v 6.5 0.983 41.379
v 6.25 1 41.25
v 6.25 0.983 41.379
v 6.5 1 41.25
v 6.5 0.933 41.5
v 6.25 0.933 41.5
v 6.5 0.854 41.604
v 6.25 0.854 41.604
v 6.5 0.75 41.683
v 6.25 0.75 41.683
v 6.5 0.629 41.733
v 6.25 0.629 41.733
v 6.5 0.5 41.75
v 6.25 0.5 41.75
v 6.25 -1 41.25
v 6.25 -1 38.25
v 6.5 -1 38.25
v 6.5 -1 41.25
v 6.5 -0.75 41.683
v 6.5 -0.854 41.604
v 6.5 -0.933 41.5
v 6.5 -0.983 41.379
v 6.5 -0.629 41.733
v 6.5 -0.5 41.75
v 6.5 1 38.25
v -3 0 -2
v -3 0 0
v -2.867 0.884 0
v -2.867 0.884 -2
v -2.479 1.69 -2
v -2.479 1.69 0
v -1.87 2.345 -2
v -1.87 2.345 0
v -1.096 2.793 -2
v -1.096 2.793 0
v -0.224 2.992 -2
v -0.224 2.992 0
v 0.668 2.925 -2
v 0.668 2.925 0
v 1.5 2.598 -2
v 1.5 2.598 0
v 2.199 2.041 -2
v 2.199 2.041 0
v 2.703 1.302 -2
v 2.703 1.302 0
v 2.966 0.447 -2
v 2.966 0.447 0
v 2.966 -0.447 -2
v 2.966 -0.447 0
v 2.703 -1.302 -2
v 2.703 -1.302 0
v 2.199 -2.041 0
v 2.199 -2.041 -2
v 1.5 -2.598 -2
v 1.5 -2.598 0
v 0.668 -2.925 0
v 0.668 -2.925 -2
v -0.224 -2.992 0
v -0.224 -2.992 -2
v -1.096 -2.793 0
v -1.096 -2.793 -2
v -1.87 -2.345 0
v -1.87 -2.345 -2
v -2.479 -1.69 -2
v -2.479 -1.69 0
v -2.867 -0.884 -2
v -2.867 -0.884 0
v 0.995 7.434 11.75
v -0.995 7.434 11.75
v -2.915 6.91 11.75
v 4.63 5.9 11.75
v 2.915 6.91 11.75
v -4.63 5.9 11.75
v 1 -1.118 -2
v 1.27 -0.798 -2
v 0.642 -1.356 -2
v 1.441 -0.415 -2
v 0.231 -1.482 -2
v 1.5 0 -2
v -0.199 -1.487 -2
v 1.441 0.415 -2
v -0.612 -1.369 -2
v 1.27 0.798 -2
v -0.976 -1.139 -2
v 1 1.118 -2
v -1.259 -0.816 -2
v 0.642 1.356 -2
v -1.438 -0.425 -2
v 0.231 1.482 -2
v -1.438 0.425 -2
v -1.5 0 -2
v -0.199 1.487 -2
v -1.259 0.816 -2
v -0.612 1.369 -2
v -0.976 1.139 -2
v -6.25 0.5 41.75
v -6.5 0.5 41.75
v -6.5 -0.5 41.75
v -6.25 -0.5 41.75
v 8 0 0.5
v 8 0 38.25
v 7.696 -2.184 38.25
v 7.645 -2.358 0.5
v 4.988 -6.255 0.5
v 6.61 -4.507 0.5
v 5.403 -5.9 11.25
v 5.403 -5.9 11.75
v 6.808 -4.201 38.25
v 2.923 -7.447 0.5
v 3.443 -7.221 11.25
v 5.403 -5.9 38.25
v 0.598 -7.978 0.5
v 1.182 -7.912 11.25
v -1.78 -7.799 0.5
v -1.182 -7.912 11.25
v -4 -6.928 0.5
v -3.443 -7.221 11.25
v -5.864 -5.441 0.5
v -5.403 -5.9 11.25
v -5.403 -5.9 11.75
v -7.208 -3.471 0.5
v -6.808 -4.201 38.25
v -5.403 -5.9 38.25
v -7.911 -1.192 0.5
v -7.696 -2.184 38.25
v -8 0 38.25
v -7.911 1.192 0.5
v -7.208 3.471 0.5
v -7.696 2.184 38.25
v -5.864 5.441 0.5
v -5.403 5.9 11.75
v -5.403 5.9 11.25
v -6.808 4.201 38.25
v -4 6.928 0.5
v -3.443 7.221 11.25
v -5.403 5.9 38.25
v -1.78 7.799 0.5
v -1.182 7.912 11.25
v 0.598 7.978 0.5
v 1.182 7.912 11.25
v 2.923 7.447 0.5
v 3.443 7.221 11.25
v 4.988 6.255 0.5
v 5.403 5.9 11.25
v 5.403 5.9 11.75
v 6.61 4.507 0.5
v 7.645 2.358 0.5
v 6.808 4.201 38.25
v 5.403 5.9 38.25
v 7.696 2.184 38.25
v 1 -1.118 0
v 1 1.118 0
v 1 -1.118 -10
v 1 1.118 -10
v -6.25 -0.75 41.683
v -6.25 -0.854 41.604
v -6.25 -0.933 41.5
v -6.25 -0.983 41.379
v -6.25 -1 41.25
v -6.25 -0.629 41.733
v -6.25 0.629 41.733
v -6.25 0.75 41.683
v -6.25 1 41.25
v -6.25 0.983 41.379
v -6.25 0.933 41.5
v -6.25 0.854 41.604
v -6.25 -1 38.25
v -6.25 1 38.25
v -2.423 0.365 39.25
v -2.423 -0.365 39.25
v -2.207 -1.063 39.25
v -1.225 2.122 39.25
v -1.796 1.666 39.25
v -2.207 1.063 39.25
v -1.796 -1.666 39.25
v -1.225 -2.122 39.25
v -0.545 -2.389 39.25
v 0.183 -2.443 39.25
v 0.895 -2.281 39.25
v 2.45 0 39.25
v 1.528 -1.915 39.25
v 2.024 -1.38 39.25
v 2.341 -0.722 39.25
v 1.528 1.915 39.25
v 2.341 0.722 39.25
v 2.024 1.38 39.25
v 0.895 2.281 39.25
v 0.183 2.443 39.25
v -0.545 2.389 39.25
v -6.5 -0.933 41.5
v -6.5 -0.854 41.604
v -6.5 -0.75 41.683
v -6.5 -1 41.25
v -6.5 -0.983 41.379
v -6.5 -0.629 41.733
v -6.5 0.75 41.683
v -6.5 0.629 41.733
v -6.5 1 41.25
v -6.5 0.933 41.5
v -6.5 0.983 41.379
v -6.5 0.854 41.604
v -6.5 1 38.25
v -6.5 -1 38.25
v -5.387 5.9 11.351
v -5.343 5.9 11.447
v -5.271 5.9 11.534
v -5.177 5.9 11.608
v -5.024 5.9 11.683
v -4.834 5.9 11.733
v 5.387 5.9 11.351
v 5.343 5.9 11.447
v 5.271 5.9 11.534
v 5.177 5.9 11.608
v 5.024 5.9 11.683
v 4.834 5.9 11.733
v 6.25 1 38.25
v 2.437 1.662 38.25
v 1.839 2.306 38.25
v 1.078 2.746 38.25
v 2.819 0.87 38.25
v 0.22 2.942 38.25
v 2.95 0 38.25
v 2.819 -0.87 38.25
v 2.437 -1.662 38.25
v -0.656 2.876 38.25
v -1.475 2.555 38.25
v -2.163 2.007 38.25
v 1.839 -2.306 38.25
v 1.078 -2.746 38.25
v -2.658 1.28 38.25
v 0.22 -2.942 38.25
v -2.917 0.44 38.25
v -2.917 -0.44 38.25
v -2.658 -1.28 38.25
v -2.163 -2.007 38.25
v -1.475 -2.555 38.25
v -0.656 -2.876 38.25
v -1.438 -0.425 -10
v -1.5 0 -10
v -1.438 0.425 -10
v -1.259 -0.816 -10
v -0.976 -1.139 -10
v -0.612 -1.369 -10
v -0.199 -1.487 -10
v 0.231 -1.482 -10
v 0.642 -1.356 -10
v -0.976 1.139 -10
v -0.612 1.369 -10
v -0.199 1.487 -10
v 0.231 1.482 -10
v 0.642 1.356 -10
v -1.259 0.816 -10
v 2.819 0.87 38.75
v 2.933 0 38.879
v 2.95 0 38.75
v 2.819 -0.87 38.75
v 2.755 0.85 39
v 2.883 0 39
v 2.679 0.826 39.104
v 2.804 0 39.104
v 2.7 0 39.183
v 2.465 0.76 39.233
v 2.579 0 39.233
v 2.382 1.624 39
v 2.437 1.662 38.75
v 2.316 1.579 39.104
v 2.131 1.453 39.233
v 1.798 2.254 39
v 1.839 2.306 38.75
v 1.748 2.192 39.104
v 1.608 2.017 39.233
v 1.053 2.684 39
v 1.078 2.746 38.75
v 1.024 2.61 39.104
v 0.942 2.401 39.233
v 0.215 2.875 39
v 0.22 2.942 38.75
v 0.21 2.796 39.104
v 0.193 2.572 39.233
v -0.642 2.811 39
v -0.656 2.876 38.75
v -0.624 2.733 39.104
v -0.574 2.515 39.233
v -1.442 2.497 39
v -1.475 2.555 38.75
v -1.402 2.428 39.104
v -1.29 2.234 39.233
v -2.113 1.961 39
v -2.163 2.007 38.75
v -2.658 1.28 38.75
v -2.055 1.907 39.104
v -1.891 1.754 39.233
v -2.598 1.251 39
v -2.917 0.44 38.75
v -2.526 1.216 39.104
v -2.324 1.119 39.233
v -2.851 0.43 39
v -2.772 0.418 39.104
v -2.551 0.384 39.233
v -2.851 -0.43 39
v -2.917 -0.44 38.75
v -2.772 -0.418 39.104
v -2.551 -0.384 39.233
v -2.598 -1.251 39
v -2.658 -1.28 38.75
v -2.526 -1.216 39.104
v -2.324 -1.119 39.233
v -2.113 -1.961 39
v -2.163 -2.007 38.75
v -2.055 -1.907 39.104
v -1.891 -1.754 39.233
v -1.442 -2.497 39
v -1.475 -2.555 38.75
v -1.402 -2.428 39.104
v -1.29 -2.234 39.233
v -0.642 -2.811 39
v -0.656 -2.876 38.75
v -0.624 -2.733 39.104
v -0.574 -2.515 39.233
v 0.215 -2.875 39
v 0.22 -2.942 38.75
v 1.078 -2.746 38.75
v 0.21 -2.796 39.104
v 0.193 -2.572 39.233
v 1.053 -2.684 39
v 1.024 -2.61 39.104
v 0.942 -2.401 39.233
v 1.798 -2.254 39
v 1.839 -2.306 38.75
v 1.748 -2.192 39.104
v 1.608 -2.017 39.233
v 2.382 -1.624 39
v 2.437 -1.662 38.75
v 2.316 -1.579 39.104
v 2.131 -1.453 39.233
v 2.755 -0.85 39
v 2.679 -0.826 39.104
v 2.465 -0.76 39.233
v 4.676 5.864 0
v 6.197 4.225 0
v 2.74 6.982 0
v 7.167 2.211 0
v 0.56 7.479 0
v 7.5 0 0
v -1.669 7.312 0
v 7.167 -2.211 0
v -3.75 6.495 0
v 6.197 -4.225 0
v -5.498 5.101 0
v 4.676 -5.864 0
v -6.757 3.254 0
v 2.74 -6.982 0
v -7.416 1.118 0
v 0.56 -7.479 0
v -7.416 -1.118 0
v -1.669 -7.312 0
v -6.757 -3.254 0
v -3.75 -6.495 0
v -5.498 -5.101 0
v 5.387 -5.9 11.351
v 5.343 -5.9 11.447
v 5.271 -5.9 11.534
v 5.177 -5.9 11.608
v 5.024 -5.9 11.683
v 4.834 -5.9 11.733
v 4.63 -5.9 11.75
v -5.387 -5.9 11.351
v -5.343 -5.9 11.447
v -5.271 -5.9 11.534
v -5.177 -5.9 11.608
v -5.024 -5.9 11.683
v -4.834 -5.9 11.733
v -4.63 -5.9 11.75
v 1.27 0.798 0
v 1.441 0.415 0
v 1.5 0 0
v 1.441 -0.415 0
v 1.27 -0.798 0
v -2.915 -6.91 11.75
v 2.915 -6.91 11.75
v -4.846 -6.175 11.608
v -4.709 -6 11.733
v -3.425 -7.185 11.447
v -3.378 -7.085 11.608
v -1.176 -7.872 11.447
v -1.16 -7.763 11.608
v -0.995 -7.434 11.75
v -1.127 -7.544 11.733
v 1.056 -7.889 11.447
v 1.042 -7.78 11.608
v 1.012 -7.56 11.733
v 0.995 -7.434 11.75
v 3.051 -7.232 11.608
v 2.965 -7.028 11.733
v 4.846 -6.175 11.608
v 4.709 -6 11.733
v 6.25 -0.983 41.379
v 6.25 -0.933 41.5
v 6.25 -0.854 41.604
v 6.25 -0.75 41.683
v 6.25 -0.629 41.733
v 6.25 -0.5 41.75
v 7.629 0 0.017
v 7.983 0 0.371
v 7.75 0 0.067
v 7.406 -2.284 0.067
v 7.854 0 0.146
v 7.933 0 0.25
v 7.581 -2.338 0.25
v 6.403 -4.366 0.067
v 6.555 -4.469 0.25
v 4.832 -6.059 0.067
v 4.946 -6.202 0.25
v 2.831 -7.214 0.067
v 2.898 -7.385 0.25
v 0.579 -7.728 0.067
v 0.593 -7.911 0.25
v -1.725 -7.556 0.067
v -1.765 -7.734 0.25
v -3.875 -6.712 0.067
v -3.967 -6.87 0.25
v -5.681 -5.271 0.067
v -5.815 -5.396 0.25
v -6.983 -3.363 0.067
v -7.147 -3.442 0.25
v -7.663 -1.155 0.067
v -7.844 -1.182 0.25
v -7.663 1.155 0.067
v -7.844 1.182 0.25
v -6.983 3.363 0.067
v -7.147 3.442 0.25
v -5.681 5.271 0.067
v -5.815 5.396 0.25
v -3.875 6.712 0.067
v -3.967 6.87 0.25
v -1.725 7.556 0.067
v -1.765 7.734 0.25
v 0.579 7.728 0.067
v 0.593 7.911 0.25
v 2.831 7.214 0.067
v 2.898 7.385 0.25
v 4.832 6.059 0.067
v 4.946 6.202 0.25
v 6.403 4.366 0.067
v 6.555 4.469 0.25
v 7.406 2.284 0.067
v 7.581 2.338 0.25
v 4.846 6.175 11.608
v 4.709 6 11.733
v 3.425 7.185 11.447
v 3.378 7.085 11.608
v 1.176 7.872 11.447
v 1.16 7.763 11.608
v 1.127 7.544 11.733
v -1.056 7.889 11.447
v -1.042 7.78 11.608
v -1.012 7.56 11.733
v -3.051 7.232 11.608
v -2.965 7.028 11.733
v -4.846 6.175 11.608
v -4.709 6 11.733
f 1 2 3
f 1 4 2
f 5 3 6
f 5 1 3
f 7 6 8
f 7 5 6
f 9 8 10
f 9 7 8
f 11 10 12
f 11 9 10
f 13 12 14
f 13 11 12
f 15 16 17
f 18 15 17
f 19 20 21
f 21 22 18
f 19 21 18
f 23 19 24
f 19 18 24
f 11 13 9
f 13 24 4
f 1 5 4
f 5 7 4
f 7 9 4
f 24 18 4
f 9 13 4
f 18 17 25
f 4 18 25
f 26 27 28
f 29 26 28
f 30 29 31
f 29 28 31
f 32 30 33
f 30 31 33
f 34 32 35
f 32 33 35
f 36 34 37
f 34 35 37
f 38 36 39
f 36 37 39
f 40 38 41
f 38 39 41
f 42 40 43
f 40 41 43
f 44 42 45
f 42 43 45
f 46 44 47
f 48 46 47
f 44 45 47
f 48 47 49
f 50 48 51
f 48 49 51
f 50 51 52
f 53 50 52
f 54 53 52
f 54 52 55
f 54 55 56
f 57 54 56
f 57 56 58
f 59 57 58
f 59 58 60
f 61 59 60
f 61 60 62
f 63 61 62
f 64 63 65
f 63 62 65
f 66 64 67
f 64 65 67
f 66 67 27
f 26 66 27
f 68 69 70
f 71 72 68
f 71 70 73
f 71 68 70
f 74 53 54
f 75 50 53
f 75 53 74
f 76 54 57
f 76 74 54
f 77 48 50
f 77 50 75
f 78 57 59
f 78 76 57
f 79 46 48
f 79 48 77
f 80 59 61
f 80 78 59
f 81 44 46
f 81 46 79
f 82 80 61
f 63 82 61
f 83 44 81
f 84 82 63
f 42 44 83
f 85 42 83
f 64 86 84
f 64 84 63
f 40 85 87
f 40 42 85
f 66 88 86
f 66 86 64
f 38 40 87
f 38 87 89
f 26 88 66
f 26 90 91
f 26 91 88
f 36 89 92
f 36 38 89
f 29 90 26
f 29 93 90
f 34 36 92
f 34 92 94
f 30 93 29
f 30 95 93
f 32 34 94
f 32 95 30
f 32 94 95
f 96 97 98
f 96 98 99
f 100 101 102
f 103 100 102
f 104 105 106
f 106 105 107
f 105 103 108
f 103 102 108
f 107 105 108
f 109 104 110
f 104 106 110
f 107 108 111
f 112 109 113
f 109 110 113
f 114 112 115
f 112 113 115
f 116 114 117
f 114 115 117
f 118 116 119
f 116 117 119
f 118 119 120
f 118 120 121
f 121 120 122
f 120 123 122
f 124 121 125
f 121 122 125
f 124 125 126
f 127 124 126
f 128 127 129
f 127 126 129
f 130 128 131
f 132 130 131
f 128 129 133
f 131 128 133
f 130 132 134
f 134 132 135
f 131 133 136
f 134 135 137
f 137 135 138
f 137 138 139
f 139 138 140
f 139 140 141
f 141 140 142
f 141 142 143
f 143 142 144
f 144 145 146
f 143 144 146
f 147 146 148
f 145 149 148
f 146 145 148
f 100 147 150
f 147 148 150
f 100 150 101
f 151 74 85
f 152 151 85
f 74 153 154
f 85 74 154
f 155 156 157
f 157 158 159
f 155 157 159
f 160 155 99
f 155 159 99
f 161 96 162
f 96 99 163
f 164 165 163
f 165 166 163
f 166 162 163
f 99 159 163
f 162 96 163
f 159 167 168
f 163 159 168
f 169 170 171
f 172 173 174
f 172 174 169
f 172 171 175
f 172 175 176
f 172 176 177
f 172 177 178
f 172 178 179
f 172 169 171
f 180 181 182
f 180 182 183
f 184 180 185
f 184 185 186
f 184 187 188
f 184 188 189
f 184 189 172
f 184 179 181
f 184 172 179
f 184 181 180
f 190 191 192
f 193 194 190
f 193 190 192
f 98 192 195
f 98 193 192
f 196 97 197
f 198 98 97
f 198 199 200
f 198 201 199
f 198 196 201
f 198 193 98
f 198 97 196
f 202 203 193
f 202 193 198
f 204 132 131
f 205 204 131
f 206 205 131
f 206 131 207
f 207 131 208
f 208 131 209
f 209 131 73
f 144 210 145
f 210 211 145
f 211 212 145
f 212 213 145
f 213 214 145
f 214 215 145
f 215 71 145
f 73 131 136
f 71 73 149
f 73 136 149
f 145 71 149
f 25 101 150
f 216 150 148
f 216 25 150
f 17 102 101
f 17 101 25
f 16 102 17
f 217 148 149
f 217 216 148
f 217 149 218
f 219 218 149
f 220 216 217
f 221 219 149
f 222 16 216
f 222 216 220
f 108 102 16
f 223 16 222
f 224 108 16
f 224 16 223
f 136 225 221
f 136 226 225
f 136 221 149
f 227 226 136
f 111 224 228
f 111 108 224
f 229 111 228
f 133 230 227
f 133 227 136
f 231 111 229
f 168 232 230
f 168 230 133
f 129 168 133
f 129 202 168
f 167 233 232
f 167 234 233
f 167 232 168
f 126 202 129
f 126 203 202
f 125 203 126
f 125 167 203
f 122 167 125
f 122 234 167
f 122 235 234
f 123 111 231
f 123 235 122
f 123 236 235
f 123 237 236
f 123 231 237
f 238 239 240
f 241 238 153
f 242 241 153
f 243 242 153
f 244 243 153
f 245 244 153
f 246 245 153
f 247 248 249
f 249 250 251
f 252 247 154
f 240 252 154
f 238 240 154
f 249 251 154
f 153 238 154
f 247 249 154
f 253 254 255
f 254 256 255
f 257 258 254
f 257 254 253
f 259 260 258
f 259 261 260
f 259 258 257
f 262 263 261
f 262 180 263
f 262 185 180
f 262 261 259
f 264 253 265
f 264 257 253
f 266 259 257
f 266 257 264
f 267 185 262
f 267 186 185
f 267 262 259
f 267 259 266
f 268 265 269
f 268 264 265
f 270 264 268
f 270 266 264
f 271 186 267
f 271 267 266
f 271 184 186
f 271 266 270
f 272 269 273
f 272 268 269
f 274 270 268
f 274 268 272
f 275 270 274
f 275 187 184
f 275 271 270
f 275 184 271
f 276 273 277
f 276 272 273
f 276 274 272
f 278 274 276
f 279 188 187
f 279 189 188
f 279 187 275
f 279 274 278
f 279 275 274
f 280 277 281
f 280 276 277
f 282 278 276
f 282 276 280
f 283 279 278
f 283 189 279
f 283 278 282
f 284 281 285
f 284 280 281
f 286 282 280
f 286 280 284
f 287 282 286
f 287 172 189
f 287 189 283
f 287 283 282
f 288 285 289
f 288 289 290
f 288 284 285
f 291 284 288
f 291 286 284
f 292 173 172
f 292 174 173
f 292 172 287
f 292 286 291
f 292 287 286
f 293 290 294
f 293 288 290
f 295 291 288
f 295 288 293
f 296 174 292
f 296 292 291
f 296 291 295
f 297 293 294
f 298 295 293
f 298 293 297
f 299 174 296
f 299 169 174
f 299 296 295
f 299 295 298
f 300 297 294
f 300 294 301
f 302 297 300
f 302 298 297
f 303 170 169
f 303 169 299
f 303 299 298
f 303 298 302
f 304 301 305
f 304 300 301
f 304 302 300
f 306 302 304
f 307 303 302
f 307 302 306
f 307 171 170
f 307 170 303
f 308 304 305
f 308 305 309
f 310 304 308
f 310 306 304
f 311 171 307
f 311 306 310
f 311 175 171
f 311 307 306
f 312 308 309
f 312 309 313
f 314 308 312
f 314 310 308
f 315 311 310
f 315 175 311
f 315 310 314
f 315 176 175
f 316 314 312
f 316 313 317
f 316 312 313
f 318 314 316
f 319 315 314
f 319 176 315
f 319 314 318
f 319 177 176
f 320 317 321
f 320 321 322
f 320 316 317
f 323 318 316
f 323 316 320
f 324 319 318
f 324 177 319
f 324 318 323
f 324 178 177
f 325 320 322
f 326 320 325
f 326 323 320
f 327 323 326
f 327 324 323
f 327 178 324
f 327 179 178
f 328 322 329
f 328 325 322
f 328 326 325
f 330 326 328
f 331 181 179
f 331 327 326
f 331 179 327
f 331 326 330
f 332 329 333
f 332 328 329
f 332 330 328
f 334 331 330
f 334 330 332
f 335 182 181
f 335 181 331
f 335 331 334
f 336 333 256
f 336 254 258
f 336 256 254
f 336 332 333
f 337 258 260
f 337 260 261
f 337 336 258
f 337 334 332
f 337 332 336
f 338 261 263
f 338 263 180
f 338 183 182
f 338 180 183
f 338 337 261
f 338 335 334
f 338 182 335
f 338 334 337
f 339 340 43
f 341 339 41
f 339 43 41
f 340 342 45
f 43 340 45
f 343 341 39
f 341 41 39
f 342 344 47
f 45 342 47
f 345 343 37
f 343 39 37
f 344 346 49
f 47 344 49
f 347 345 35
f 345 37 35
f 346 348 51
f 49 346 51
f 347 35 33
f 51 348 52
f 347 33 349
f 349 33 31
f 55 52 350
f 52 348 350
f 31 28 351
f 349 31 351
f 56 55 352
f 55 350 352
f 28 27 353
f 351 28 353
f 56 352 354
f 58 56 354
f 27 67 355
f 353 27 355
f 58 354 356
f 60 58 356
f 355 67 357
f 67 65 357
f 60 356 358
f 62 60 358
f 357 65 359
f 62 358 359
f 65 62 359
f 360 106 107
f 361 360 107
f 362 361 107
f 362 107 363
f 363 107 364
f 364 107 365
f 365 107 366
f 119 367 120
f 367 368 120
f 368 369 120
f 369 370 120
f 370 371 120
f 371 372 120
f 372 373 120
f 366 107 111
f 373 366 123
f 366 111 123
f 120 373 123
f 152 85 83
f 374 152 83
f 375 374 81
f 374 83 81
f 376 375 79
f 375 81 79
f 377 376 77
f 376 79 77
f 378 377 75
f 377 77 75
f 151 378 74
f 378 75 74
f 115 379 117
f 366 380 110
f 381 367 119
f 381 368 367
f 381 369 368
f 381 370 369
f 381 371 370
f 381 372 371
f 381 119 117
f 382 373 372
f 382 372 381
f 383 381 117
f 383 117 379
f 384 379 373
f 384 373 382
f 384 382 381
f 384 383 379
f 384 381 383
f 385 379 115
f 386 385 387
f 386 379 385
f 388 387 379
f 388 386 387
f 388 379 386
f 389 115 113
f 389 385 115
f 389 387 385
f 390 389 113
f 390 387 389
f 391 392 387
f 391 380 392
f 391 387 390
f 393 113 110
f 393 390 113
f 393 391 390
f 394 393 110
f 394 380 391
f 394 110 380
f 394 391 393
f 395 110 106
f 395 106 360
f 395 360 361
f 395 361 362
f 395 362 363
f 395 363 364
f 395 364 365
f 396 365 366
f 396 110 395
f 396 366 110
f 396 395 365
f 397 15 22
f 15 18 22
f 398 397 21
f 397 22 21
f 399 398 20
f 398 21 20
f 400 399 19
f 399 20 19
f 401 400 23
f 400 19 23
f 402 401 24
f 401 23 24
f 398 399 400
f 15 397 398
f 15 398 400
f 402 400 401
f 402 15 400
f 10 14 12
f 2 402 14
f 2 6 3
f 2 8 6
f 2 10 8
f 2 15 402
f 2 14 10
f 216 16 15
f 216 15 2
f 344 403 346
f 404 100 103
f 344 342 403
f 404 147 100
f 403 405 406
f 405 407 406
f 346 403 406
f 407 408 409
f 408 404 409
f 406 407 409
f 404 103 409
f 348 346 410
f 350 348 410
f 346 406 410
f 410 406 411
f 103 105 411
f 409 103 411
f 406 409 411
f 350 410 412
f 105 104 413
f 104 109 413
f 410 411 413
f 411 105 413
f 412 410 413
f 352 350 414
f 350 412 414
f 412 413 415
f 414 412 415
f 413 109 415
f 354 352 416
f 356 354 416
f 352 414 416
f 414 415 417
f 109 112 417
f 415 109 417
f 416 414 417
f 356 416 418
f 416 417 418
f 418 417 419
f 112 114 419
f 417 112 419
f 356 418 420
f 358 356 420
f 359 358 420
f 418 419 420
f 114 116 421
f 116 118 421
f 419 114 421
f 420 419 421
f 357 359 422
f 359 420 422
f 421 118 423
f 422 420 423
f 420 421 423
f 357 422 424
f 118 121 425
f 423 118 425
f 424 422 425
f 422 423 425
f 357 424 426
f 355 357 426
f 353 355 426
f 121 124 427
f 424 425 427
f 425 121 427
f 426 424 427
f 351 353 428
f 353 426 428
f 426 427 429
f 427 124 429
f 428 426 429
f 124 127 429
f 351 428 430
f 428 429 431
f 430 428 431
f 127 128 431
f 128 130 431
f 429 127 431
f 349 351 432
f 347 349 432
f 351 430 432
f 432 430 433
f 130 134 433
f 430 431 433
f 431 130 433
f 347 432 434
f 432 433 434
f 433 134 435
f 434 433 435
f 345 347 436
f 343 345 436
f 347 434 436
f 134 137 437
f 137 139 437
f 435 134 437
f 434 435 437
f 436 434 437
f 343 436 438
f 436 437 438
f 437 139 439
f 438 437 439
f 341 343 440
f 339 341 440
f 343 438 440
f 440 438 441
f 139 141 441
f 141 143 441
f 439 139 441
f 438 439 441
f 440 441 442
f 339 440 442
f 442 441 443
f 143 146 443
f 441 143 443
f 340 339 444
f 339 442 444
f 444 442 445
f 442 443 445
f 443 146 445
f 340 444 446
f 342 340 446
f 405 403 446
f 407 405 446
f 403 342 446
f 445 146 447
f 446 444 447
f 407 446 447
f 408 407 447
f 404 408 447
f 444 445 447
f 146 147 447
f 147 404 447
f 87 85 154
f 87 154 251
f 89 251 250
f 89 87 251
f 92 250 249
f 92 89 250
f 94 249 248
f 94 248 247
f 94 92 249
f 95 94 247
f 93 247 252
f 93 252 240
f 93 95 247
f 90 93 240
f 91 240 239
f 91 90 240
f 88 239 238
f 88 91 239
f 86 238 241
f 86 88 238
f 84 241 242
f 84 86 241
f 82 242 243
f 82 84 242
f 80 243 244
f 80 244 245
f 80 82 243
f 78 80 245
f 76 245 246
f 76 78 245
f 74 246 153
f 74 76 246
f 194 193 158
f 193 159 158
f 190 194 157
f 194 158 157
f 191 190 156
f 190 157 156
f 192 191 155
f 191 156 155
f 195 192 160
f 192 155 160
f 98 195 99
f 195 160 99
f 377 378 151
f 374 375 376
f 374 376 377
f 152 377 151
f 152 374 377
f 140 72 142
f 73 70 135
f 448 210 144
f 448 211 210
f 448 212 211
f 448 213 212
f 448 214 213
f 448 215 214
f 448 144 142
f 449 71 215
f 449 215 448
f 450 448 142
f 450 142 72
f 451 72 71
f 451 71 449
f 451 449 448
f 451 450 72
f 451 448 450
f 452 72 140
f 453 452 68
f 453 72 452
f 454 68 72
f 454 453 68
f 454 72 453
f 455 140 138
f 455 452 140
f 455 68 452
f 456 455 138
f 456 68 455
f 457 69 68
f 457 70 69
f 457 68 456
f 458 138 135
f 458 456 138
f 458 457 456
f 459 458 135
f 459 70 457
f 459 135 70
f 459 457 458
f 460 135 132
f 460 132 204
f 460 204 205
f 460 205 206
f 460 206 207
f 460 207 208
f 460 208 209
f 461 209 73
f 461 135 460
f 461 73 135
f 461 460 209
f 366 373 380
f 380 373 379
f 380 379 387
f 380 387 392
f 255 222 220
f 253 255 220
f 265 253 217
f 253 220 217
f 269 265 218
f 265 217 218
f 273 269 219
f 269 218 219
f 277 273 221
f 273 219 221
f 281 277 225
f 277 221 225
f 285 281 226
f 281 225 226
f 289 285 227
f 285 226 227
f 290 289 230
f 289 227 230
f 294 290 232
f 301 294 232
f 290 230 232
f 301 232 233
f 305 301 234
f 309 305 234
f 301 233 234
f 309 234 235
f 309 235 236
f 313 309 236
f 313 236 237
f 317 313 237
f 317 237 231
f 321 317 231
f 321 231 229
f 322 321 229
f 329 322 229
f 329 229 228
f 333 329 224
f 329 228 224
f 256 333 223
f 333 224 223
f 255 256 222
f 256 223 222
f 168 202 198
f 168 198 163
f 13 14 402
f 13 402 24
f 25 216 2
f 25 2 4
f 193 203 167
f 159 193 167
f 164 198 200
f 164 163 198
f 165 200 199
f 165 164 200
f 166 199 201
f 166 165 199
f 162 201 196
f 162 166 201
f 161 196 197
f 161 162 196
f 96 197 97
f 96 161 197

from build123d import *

# Parameters (mm, degrees)
SKETCH1_W           = 8
SKETCH1_H           = 38.25
SKETCH2_R           = 3
BOSS_EXTRUDE1_DEPTH = 2
BOSS_EXTRUDE2_DEPTH = 8
CUT_EXTRUDE1_DEPTH  = 2
CUT_EXTRUDE2_DEPTH  = 26.5
CUT_EXTRUDE3_DEPTH  = 26.5
SKETCH7_W           = 0.25
SKETCH7_H           = 2
BOSS_EXTRUDE3_DEPTH = 3.5
SKETCH8_W           = 0.25
SKETCH8_H           = 2
BOSS_EXTRUDE4_DEPTH = 3.5
SKETCH9_R           = 2.95
BOSS_EXTRUDE5_DEPTH = 1
FILLET1_R           = 0.5


with BuildPart() as part:
    # Sketch1 → Revolve1 (revolve)
    with BuildSketch(Plane.XZ):
        with Locations((4, 19.125)):
            Rectangle(SKETCH1_W, SKETCH1_H)
    revolve(axis=Axis((0, 0, 38.25), (0, 0, -1)))

    # Sketch2 → Boss-Extrude1 (add)
    with BuildSketch(Plane(origin=(0, 0, 0), x_dir=(-1, 0, 0), z_dir=(0, 0, -1))):
        Circle(SKETCH2_R)
    extrude(amount=BOSS_EXTRUDE1_DEPTH)

    # Sketch3 → Boss-Extrude2 (add)
    with BuildSketch(Plane(origin=(0, 0, -2), x_dir=(-1, 0, 0), z_dir=(0, 0, -1))):
        with BuildLine():
            Line((-1, -1.118033989), (-1, 1.118033989))
            ThreePointArc((-1, 1.118033989), (1.5, 0), (-1, -1.118033989))
        make_face()
    extrude(amount=BOSS_EXTRUDE2_DEPTH)

    # Sketch4 → Cut-Extrude1 (cut)
    with BuildSketch(Plane(origin=(0, 0, -2), x_dir=(-1, 0, 0), z_dir=(0, 0, -1))):
        with BuildLine():
            Line((-1, -1.118033989), (-1, 1.118033989))
            ThreePointArc((-1, 1.118033989), (-1.5, 0), (-1, -1.118033989))
        make_face()
    extrude(amount=-CUT_EXTRUDE1_DEPTH, mode=Mode.SUBTRACT)

    # Sketch5 → Cut-Extrude2 (cut)
    with BuildSketch(Plane.XY.offset(38.25)):
        with BuildLine():
            Line((-5.402777064, 5.9), (5.402777064, 5.9))
            ThreePointArc((5.402777064, 5.9), (0, 8), (-5.402777064, 5.9))
        make_face()
    extrude(amount=-CUT_EXTRUDE2_DEPTH, mode=Mode.SUBTRACT)

    # Sketch6 → Cut-Extrude3 (cut)
    with BuildSketch(Plane.XY.offset(38.25)):
        with BuildLine():
            Line((5.402777064, -5.9), (-5.402777064, -5.9))
            ThreePointArc((-5.402777064, -5.9), (0, -8), (5.402777064, -5.9))
        make_face()
    extrude(amount=-CUT_EXTRUDE3_DEPTH, mode=Mode.SUBTRACT)

    # Sketch7 → Boss-Extrude3 (add)
    with BuildSketch(Plane.XY.offset(38.25)):
        with Locations((-6.375, 0)):
            Rectangle(SKETCH7_W, SKETCH7_H)
    extrude(amount=BOSS_EXTRUDE3_DEPTH)

    # Sketch8 → Boss-Extrude4 (add)
    with BuildSketch(Plane.XY.offset(38.25)):
        with Locations((6.375, 0)):
            Rectangle(SKETCH8_W, SKETCH8_H)
    extrude(amount=BOSS_EXTRUDE4_DEPTH)

    # Sketch9 → Boss-Extrude5 (add)
    with BuildSketch(Plane.XY.offset(38.25)):
        Circle(SKETCH9_R)
    extrude(amount=BOSS_EXTRUDE5_DEPTH)

    # Fillet1
    fillet1_edges = [part.edges().sort_by_distance(p)[0] for p in [
        (0, 8, 11.75),
        (0, -8, 11.75),
        (-8, 0, 0),
        (-6.375, -1, 41.75),
        (-6.375, 1, 41.75),
        (6.375, -1, 41.75),
        (6.375, 1, 41.75),
        (-2.95, 0, 39.25),
    ]]
    fillet(fillet1_edges, radius=FILLET1_R)


solid = part.part
